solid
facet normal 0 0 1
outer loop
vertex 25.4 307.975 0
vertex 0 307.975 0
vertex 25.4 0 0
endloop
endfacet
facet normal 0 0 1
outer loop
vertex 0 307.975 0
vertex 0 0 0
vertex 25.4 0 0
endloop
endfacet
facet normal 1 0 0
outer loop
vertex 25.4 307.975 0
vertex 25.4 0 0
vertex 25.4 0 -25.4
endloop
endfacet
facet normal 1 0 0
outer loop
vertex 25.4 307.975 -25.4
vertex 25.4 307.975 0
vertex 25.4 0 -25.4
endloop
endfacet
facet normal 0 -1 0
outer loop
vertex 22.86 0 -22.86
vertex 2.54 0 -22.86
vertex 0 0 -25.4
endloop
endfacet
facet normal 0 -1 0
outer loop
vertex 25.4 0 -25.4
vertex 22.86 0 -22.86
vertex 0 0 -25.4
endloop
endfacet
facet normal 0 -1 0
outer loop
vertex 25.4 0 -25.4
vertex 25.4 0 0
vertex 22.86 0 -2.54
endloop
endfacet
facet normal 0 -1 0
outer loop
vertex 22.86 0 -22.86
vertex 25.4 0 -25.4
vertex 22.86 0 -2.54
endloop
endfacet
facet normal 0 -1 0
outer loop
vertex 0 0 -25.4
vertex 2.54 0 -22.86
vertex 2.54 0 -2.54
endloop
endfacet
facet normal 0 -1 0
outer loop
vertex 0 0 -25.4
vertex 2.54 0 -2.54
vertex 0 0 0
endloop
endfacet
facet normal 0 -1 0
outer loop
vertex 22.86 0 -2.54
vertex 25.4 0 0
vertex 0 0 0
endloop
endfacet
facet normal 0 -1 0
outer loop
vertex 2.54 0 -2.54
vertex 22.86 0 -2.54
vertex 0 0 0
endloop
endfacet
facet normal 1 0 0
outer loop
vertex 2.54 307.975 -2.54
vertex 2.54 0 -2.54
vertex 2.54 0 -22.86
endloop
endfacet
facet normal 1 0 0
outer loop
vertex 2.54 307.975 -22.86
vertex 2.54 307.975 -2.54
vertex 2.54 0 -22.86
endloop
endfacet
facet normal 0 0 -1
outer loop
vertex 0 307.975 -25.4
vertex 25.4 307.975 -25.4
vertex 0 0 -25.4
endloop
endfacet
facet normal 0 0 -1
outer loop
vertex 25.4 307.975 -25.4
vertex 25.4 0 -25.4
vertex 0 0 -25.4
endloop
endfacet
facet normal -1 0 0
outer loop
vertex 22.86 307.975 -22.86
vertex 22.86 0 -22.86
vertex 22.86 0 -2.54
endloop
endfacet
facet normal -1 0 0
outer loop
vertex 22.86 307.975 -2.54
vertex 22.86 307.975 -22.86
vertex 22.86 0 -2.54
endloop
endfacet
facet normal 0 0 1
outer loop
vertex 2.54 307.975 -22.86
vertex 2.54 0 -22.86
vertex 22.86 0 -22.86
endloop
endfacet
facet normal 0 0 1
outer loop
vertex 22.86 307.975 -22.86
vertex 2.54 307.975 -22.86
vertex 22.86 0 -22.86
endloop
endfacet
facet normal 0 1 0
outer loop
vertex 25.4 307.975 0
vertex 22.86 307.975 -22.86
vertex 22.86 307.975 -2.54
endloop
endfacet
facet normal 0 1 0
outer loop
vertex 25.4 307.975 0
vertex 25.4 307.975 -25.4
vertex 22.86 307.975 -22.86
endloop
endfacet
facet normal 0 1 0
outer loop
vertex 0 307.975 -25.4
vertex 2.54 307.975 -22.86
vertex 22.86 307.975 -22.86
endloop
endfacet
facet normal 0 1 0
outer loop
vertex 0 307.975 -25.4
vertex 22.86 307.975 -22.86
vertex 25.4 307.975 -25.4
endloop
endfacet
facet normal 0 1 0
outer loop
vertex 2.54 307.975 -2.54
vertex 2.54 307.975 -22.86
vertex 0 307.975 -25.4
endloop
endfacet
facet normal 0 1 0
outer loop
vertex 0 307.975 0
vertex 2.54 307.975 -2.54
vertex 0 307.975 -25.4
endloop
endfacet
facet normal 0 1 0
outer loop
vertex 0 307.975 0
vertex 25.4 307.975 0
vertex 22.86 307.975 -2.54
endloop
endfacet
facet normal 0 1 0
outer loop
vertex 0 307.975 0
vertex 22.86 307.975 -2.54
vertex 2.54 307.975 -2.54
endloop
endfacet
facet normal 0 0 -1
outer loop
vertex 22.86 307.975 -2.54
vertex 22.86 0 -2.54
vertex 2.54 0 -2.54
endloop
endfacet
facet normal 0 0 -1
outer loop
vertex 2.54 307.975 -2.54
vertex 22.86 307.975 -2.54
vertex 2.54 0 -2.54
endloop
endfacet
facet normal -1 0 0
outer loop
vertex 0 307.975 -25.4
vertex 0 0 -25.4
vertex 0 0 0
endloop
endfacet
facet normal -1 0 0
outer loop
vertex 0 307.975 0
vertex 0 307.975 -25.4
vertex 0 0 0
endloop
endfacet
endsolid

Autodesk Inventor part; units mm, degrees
ref_plane "YZ Plane" through (0, 0, 0) normal (1, 0, 0) x (0, 1, 0)
ref_plane "XZ Plane" through (0, 0, 0) normal (0, 1, 0) x (-1, 0, 0)
ref_plane "XY Plane" through (0, 0, 0) normal (0, 0, 1) x (1, 0, 0)
sketch "Sketch1" plane through (0, 0, 0) normal (0, 1, 0) x (-1, 0, 0)
  line L0 (0, 0) -> (-25.4, 0)
  line L1 (-25.4, 0) -> (-25.4, -25.4)
  line L2 (-25.4, -25.4) -> (0, -25.4)
  line L3 (0, -25.4) -> (0, 0)
  dimension "d0" = 25.4
  dimension "d1" = 25.4
extrude "Extrusion1" add sketch "Sketch1" along normal blind 307.975
sketch "Sketch4" plane through (0, 0, 0) normal (0, -1, 0) x (1, 0, 0)
  line L0 (22.86, -2.54) -> (2.54, -2.54)
  line L1 (2.54, -2.54) -> (2.54, -22.86)
  line L2 (2.54, -22.86) -> (22.86, -22.86)
  line L3 (22.86, -22.86) -> (22.86, -2.54)
  line L4 (25.4, 0) -> (25.4, -25.4) projected
  line L5 (25.4, -25.4) -> (0, -25.4) projected
  point P0 (0, 0)
  dimension "d13" = 20.32
  dimension "d14" = 20.32
  dimension "d15" = 2.54
  dimension "d16" = 2.54
extrude "Extrusion4" cut sketch "Sketch4" against normal blind 448.31
sketch "Sketch15" plane through (0, 0, -25.4) normal (-1, 0, 0) x (0, 0, 1)
  point P0 (25.4, 0)
properties part number "Control Panel Mount"
